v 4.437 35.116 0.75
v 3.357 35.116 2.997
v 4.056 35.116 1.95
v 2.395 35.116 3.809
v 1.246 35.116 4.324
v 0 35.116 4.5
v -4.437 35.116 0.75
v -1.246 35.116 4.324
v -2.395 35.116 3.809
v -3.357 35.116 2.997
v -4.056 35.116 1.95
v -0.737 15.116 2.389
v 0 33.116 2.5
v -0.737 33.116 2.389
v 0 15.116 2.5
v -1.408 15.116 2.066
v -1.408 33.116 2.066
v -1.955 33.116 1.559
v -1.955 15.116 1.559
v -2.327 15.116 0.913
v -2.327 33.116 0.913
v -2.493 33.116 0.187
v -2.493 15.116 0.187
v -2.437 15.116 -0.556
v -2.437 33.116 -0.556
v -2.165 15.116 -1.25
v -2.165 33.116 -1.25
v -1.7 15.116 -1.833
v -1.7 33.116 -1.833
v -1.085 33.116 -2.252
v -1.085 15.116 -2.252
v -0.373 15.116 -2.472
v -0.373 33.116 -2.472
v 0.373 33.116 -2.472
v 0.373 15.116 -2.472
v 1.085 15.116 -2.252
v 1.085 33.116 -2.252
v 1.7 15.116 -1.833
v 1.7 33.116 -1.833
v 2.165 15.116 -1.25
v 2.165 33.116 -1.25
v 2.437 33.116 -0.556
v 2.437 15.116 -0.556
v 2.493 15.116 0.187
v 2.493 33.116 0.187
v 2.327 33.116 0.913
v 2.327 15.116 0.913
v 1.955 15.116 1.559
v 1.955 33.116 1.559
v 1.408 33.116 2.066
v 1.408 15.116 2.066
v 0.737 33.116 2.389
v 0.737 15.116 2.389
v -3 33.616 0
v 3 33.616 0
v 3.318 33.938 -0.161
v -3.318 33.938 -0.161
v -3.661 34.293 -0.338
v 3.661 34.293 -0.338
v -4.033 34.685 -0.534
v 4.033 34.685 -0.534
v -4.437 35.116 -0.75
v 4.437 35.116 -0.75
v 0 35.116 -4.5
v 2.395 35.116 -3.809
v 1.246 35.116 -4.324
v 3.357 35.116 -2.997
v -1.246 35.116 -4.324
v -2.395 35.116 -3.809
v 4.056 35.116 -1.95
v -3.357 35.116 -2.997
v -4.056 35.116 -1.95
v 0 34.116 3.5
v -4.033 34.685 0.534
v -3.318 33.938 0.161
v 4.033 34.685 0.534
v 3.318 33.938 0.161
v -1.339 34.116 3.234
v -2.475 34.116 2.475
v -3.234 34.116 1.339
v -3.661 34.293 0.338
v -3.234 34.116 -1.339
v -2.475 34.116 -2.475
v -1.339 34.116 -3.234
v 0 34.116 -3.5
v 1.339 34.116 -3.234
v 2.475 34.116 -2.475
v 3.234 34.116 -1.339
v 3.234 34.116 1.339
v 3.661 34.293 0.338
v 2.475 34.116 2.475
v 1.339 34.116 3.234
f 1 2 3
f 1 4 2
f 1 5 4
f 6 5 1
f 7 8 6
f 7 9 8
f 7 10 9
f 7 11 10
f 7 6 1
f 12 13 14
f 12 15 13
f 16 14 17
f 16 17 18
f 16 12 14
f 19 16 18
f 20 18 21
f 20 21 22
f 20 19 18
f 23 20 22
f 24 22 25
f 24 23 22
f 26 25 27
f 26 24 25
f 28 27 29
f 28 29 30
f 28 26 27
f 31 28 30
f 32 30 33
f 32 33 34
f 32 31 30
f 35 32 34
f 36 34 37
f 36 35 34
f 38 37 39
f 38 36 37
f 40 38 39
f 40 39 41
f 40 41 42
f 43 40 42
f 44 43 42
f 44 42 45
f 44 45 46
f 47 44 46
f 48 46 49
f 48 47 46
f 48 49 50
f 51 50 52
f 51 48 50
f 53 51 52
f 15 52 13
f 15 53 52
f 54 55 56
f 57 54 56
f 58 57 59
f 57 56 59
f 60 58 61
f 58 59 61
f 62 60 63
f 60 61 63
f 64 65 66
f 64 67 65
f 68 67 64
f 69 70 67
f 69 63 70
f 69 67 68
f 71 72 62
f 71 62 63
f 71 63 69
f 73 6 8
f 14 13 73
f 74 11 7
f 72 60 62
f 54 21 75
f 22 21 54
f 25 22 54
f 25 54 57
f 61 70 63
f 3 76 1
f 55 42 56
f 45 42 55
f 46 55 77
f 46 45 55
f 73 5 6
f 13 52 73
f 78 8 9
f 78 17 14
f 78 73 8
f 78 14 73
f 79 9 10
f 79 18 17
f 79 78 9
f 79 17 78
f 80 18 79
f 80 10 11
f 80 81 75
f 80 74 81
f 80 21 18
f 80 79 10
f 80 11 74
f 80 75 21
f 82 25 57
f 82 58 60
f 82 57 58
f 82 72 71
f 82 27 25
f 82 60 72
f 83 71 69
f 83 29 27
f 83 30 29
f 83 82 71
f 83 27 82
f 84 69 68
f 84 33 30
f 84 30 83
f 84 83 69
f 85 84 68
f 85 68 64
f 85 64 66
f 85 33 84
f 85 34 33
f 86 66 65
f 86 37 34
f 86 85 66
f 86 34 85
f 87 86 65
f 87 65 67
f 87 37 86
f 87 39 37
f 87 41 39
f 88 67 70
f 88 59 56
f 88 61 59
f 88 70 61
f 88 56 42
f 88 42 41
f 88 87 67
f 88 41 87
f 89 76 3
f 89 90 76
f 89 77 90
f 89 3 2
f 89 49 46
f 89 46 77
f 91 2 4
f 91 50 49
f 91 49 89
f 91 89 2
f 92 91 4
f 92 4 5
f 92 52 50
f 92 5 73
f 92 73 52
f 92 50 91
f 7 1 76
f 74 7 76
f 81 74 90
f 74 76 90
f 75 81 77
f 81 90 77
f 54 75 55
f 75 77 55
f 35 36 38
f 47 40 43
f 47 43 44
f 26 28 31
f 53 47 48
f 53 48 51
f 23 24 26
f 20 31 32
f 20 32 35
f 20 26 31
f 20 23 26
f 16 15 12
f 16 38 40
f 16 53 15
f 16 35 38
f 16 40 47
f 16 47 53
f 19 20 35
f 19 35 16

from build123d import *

# Parameters (mm, degrees)
EXTRUDE1_DEPTH = 5


with BuildPart() as part:
    # Sketch1 → Revolve1 (revolve)
    with BuildSketch(Plane.XY, mode=Mode.PRIVATE) as revolve1_sk:
        Polygon((0, 35.11626506), (4.5, 35.11626506), (2.5, 33.11626506), (2.5, 15.11626506), (0, 15.11626506), align=None)
    revolve(revolve1_sk.sketch.rotate(Axis((0, 45.521084337, 0), (0, -1, 0)), 90), axis=Axis((0, 45.521084337, 0), (0, -1, 0)))

    # Sketch2 → Extrude1 (cut, symmetric)
    with BuildSketch(Plane(origin=(0, 0, 0), x_dir=(0, 0, -1), z_dir=(1, 0, 0))):
        Polygon((-0.75, 35.11626506), (0, 33.61626506), (0.75, 35.11626506), align=None)
    extrude(amount=EXTRUDE1_DEPTH, both=True, mode=Mode.SUBTRACT)


solid = part.part
